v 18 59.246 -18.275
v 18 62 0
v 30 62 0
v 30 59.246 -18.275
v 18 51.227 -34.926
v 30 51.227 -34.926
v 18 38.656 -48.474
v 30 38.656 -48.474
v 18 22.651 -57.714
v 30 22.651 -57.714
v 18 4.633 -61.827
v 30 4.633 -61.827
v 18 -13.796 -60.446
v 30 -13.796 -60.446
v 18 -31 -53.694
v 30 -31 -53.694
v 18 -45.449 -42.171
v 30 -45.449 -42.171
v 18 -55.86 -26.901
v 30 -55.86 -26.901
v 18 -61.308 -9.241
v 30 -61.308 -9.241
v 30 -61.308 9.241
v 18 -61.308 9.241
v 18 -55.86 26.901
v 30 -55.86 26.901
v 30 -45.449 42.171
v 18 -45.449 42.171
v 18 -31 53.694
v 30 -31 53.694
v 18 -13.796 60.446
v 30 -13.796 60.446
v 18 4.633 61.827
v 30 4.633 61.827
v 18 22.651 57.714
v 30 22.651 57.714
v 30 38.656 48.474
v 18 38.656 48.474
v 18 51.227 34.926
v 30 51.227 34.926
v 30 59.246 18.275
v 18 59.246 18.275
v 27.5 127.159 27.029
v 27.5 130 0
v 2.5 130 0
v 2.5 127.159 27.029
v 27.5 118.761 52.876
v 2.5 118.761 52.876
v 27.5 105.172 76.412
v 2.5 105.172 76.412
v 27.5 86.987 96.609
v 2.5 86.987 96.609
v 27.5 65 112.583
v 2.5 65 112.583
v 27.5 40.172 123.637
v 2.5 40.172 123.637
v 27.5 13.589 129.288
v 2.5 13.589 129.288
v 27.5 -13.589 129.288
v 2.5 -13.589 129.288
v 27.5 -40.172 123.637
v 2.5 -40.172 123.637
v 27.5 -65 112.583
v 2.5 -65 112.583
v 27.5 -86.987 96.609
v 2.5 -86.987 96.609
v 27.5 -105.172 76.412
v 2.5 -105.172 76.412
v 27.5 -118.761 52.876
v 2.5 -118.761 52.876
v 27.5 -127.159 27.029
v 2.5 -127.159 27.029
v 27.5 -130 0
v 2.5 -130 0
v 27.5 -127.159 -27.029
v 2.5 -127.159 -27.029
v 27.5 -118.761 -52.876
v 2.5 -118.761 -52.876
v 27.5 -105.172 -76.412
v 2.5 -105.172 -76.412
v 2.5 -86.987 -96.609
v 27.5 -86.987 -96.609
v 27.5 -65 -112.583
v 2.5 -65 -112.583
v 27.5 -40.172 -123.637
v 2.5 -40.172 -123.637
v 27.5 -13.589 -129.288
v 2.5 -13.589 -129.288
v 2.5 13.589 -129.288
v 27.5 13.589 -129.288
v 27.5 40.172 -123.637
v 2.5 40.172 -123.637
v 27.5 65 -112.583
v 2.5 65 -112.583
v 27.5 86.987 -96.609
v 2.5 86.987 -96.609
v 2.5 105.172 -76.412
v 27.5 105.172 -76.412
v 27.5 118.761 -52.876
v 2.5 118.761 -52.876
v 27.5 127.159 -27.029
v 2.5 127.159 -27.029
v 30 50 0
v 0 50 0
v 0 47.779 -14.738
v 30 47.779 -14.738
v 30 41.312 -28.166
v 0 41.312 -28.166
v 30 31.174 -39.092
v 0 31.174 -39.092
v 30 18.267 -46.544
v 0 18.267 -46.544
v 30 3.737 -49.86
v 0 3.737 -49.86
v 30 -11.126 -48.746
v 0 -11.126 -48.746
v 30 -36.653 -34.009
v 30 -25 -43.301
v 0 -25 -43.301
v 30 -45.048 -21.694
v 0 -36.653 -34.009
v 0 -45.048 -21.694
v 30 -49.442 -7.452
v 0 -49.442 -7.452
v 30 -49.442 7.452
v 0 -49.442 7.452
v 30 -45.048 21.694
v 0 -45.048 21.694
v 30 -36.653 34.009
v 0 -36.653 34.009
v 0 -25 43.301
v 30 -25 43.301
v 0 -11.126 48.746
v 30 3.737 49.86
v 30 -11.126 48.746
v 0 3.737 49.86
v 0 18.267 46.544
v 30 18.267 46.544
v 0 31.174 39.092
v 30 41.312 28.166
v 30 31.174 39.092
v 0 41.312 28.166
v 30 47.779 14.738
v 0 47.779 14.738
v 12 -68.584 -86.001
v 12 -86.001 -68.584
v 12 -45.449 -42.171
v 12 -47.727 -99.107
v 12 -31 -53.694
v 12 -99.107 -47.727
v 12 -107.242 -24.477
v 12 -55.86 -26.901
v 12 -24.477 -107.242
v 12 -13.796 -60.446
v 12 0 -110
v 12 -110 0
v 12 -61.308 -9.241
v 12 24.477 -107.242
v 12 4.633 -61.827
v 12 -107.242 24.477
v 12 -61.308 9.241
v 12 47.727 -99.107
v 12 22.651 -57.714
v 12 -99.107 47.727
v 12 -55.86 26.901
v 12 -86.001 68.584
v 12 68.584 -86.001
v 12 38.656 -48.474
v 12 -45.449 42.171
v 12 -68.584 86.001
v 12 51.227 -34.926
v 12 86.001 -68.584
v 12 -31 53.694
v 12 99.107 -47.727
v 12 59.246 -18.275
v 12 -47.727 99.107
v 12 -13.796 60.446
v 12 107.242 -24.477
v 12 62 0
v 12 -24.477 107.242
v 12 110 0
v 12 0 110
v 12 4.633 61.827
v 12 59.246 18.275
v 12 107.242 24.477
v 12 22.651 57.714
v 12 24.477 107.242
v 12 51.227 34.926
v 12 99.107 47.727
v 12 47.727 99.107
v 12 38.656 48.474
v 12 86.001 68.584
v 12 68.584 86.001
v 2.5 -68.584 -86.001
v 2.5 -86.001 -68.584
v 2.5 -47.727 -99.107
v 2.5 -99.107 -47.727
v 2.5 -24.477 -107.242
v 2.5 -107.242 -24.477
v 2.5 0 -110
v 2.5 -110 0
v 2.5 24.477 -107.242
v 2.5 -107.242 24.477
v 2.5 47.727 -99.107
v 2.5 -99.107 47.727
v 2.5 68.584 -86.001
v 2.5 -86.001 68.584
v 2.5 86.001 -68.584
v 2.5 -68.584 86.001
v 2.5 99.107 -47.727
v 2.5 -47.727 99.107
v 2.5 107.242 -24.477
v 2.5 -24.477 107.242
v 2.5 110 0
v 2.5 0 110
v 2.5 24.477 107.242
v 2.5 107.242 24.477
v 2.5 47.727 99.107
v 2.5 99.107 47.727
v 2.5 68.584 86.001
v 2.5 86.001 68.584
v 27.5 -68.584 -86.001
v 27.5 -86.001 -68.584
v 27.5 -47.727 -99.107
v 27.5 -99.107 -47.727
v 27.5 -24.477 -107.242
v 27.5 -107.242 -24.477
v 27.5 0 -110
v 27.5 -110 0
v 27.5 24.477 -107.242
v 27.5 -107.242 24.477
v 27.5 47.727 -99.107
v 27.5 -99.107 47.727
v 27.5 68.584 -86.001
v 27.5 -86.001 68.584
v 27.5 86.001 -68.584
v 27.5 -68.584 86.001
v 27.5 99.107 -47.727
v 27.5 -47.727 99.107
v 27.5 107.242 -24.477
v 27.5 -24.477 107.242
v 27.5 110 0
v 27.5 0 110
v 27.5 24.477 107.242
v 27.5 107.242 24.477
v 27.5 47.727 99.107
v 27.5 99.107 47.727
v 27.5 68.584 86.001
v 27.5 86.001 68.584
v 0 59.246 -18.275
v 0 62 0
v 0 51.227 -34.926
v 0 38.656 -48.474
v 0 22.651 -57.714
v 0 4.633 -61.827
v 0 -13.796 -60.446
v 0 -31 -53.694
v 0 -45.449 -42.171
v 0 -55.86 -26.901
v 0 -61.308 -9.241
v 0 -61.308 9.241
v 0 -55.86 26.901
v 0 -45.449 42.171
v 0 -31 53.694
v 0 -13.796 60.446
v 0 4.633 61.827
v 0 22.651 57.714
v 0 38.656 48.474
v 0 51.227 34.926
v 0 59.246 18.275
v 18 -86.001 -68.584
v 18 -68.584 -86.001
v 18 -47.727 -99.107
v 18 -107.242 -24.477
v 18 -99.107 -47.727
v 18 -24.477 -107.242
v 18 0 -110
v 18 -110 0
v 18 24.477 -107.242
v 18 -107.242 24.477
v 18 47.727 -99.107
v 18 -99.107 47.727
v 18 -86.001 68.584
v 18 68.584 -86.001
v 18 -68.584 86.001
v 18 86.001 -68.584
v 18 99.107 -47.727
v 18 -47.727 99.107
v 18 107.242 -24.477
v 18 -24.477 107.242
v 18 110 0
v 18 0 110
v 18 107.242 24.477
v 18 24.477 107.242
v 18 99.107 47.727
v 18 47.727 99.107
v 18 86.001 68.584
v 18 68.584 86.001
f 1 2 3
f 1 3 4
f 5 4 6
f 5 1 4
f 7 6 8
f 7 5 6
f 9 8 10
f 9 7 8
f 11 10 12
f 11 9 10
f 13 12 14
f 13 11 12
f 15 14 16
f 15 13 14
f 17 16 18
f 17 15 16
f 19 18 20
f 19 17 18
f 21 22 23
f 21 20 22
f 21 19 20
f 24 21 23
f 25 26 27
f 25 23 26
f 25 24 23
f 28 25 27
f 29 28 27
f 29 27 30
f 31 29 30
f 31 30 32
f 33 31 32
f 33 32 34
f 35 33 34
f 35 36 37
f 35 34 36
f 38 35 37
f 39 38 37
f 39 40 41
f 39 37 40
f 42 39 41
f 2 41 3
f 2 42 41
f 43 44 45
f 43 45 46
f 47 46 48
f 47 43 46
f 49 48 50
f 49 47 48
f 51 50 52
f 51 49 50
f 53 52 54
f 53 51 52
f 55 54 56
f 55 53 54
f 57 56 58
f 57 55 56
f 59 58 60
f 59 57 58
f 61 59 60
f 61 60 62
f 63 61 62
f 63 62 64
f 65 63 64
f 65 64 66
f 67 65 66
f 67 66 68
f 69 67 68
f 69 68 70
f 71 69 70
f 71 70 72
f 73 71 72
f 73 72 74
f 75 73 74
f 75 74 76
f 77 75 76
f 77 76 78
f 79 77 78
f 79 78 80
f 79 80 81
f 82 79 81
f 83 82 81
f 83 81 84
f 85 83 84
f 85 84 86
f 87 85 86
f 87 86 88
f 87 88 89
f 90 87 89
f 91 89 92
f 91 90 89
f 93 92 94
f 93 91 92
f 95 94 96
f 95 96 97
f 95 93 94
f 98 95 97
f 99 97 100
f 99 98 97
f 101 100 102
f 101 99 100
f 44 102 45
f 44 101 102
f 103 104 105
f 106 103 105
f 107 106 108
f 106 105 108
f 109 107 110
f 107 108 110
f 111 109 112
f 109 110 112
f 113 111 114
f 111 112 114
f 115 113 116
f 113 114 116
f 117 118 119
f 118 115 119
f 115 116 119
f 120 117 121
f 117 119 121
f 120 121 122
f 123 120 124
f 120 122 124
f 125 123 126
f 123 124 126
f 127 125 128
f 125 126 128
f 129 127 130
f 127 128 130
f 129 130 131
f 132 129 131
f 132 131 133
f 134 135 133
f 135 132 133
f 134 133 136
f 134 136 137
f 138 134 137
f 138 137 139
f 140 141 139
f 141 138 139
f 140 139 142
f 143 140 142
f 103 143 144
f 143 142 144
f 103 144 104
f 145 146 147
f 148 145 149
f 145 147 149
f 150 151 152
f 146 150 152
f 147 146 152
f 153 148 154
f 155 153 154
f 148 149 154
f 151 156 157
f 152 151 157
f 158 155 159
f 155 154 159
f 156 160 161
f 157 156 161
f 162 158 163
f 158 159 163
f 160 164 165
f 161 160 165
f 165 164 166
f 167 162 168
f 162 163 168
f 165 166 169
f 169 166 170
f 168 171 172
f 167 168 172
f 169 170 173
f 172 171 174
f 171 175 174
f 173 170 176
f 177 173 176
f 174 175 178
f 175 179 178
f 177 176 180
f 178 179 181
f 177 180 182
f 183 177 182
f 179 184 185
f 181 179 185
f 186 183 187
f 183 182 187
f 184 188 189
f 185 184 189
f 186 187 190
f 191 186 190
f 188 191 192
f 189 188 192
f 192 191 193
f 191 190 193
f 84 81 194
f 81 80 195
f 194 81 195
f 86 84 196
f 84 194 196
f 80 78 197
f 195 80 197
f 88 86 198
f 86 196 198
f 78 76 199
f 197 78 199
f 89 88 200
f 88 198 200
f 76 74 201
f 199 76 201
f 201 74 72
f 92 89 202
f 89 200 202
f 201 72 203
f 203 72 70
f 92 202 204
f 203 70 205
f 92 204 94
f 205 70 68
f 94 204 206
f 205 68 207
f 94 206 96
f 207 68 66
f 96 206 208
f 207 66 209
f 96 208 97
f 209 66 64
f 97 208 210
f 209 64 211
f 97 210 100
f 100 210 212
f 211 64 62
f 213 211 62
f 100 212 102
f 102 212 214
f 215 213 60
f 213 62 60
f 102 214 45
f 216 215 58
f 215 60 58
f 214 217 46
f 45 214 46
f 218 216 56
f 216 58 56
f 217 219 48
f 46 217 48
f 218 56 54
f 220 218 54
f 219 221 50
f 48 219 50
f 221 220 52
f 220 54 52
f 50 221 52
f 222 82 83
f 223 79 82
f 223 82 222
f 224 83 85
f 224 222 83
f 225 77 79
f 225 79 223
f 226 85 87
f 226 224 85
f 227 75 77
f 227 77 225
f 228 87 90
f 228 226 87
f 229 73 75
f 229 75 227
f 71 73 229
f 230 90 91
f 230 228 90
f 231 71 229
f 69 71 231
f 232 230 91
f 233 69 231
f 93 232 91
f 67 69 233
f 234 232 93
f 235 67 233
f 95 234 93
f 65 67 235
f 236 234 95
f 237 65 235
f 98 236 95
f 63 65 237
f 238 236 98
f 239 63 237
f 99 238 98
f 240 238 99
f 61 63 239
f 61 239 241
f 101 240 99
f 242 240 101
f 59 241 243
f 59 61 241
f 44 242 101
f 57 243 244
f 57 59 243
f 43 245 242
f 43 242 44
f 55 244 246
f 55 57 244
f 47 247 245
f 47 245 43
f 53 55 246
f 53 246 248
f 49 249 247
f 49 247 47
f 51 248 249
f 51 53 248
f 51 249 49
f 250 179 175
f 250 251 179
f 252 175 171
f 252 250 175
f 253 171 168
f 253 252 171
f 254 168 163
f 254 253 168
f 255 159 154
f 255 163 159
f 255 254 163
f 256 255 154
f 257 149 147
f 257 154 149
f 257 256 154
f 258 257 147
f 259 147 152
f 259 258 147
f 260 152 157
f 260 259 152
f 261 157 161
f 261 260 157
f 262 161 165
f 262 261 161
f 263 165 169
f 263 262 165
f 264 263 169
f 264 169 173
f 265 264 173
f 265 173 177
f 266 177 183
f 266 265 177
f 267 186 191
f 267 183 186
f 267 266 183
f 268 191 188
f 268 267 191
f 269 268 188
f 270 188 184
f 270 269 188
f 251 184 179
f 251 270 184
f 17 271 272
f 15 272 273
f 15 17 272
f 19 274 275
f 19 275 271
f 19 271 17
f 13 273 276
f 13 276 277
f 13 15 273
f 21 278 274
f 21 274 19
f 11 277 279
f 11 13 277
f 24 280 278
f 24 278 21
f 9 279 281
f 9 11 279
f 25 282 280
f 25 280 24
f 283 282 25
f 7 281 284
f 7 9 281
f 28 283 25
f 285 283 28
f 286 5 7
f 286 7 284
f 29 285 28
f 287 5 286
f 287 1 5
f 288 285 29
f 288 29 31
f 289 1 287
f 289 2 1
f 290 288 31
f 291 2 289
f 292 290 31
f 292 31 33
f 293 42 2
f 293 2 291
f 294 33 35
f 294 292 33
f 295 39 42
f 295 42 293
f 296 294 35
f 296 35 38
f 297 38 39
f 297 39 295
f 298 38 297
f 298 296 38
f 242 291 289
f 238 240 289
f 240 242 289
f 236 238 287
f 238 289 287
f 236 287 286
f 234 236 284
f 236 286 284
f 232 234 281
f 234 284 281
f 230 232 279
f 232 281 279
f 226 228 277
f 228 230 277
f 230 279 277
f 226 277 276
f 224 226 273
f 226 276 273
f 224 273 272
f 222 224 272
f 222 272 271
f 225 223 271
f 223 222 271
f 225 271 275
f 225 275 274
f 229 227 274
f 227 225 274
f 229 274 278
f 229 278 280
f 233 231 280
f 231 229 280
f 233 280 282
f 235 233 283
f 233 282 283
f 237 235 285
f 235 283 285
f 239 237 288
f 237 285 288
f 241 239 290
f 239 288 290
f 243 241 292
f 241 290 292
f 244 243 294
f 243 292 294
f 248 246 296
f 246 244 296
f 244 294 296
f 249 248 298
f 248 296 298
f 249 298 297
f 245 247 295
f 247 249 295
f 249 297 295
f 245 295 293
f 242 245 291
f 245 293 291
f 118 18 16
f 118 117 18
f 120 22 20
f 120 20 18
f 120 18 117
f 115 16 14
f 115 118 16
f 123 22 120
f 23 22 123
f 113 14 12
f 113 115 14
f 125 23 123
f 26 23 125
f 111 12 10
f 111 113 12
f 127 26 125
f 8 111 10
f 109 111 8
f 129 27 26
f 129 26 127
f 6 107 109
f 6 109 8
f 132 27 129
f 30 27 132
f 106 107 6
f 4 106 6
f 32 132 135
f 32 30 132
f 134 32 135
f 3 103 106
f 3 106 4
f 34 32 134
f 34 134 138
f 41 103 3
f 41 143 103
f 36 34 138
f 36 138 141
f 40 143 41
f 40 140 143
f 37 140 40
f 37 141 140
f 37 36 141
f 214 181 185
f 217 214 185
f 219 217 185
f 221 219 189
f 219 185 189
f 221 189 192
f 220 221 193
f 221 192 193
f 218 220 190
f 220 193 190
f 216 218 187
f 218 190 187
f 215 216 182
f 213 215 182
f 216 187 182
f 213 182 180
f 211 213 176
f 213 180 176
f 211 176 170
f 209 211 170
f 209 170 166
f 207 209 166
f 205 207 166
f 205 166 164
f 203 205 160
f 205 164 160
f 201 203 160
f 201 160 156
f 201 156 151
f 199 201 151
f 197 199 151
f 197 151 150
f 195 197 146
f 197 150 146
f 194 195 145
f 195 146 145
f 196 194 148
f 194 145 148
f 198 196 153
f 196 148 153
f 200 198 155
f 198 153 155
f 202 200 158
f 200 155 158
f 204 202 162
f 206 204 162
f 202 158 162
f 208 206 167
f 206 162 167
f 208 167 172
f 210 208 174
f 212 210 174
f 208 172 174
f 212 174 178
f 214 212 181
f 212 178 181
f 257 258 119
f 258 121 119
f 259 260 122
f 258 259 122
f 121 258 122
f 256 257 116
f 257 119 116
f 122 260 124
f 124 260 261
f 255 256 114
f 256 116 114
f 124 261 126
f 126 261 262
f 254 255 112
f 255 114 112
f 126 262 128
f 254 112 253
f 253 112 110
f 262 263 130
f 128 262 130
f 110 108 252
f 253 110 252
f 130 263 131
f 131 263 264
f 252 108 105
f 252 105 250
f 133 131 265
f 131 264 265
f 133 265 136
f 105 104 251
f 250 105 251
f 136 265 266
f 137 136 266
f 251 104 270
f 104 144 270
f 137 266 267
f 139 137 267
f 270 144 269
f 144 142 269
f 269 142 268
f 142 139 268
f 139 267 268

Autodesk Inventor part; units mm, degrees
ref_plane "XZ Plane" through (0, 0, 0) normal (0, 1, 0) x (-1, 0, 0)
sketch "Sketch1" plane through (0, 0, 0) normal (1, 0, 0) x (0, 1, 0)
  circle A0 centre (0, 0) radius 50
  circle A1 centre (0, 0) radius 62
  dimension "d0" = 100
  dimension "d1" = 124
extrude "Extrusion1" add sketch "Sketch1" along normal blind 30
ref_plane "Work Plane1" through (0, 0, 0) normal (0, 0, 1) x (1, 0, 0)
sketch "Sketch2" plane through (0, 0, 0) normal (0, 0, 1) x (1, 0, 0)
  line L0 (0, 62) -> (30, 62) projected
  line L1 (18, 62) -> (18, 110)
  line L2 (18, 110) -> (12, 110)
  line L3 (12, 110) -> (12, 62)
  line L4 (0, -62) -> (0, 62) projected
  line L5 (-6, 0) -> (36, 0) projected
  point P0 (0, 0)
  dimension "d5" = 6
  dimension "d6" = 12
  dimension "d7" = 48
revolve "Revolution1" add sketch "Sketch2" angle 360 about axis through (-10, 0, 0) along (1, 0, 0)
ref_plane "Work Plane2" through (15, 0, 0) normal (1, 0, 0) x (0, 1, 0)
sketch "Sketch3" plane through (15, 0, 0) normal (1, 0, 0) x (0, 1, 0)
  circle A0 centre (0, 0) radius 130
  circle A1 centre (0, 0) radius 110
  dimension "d10" = 260
  dimension "d11" = 220
extrude "Extrusion2" add sketch "Sketch3" along normal mid plane 25
properties part number "DiscoPaleStadio4-10"
